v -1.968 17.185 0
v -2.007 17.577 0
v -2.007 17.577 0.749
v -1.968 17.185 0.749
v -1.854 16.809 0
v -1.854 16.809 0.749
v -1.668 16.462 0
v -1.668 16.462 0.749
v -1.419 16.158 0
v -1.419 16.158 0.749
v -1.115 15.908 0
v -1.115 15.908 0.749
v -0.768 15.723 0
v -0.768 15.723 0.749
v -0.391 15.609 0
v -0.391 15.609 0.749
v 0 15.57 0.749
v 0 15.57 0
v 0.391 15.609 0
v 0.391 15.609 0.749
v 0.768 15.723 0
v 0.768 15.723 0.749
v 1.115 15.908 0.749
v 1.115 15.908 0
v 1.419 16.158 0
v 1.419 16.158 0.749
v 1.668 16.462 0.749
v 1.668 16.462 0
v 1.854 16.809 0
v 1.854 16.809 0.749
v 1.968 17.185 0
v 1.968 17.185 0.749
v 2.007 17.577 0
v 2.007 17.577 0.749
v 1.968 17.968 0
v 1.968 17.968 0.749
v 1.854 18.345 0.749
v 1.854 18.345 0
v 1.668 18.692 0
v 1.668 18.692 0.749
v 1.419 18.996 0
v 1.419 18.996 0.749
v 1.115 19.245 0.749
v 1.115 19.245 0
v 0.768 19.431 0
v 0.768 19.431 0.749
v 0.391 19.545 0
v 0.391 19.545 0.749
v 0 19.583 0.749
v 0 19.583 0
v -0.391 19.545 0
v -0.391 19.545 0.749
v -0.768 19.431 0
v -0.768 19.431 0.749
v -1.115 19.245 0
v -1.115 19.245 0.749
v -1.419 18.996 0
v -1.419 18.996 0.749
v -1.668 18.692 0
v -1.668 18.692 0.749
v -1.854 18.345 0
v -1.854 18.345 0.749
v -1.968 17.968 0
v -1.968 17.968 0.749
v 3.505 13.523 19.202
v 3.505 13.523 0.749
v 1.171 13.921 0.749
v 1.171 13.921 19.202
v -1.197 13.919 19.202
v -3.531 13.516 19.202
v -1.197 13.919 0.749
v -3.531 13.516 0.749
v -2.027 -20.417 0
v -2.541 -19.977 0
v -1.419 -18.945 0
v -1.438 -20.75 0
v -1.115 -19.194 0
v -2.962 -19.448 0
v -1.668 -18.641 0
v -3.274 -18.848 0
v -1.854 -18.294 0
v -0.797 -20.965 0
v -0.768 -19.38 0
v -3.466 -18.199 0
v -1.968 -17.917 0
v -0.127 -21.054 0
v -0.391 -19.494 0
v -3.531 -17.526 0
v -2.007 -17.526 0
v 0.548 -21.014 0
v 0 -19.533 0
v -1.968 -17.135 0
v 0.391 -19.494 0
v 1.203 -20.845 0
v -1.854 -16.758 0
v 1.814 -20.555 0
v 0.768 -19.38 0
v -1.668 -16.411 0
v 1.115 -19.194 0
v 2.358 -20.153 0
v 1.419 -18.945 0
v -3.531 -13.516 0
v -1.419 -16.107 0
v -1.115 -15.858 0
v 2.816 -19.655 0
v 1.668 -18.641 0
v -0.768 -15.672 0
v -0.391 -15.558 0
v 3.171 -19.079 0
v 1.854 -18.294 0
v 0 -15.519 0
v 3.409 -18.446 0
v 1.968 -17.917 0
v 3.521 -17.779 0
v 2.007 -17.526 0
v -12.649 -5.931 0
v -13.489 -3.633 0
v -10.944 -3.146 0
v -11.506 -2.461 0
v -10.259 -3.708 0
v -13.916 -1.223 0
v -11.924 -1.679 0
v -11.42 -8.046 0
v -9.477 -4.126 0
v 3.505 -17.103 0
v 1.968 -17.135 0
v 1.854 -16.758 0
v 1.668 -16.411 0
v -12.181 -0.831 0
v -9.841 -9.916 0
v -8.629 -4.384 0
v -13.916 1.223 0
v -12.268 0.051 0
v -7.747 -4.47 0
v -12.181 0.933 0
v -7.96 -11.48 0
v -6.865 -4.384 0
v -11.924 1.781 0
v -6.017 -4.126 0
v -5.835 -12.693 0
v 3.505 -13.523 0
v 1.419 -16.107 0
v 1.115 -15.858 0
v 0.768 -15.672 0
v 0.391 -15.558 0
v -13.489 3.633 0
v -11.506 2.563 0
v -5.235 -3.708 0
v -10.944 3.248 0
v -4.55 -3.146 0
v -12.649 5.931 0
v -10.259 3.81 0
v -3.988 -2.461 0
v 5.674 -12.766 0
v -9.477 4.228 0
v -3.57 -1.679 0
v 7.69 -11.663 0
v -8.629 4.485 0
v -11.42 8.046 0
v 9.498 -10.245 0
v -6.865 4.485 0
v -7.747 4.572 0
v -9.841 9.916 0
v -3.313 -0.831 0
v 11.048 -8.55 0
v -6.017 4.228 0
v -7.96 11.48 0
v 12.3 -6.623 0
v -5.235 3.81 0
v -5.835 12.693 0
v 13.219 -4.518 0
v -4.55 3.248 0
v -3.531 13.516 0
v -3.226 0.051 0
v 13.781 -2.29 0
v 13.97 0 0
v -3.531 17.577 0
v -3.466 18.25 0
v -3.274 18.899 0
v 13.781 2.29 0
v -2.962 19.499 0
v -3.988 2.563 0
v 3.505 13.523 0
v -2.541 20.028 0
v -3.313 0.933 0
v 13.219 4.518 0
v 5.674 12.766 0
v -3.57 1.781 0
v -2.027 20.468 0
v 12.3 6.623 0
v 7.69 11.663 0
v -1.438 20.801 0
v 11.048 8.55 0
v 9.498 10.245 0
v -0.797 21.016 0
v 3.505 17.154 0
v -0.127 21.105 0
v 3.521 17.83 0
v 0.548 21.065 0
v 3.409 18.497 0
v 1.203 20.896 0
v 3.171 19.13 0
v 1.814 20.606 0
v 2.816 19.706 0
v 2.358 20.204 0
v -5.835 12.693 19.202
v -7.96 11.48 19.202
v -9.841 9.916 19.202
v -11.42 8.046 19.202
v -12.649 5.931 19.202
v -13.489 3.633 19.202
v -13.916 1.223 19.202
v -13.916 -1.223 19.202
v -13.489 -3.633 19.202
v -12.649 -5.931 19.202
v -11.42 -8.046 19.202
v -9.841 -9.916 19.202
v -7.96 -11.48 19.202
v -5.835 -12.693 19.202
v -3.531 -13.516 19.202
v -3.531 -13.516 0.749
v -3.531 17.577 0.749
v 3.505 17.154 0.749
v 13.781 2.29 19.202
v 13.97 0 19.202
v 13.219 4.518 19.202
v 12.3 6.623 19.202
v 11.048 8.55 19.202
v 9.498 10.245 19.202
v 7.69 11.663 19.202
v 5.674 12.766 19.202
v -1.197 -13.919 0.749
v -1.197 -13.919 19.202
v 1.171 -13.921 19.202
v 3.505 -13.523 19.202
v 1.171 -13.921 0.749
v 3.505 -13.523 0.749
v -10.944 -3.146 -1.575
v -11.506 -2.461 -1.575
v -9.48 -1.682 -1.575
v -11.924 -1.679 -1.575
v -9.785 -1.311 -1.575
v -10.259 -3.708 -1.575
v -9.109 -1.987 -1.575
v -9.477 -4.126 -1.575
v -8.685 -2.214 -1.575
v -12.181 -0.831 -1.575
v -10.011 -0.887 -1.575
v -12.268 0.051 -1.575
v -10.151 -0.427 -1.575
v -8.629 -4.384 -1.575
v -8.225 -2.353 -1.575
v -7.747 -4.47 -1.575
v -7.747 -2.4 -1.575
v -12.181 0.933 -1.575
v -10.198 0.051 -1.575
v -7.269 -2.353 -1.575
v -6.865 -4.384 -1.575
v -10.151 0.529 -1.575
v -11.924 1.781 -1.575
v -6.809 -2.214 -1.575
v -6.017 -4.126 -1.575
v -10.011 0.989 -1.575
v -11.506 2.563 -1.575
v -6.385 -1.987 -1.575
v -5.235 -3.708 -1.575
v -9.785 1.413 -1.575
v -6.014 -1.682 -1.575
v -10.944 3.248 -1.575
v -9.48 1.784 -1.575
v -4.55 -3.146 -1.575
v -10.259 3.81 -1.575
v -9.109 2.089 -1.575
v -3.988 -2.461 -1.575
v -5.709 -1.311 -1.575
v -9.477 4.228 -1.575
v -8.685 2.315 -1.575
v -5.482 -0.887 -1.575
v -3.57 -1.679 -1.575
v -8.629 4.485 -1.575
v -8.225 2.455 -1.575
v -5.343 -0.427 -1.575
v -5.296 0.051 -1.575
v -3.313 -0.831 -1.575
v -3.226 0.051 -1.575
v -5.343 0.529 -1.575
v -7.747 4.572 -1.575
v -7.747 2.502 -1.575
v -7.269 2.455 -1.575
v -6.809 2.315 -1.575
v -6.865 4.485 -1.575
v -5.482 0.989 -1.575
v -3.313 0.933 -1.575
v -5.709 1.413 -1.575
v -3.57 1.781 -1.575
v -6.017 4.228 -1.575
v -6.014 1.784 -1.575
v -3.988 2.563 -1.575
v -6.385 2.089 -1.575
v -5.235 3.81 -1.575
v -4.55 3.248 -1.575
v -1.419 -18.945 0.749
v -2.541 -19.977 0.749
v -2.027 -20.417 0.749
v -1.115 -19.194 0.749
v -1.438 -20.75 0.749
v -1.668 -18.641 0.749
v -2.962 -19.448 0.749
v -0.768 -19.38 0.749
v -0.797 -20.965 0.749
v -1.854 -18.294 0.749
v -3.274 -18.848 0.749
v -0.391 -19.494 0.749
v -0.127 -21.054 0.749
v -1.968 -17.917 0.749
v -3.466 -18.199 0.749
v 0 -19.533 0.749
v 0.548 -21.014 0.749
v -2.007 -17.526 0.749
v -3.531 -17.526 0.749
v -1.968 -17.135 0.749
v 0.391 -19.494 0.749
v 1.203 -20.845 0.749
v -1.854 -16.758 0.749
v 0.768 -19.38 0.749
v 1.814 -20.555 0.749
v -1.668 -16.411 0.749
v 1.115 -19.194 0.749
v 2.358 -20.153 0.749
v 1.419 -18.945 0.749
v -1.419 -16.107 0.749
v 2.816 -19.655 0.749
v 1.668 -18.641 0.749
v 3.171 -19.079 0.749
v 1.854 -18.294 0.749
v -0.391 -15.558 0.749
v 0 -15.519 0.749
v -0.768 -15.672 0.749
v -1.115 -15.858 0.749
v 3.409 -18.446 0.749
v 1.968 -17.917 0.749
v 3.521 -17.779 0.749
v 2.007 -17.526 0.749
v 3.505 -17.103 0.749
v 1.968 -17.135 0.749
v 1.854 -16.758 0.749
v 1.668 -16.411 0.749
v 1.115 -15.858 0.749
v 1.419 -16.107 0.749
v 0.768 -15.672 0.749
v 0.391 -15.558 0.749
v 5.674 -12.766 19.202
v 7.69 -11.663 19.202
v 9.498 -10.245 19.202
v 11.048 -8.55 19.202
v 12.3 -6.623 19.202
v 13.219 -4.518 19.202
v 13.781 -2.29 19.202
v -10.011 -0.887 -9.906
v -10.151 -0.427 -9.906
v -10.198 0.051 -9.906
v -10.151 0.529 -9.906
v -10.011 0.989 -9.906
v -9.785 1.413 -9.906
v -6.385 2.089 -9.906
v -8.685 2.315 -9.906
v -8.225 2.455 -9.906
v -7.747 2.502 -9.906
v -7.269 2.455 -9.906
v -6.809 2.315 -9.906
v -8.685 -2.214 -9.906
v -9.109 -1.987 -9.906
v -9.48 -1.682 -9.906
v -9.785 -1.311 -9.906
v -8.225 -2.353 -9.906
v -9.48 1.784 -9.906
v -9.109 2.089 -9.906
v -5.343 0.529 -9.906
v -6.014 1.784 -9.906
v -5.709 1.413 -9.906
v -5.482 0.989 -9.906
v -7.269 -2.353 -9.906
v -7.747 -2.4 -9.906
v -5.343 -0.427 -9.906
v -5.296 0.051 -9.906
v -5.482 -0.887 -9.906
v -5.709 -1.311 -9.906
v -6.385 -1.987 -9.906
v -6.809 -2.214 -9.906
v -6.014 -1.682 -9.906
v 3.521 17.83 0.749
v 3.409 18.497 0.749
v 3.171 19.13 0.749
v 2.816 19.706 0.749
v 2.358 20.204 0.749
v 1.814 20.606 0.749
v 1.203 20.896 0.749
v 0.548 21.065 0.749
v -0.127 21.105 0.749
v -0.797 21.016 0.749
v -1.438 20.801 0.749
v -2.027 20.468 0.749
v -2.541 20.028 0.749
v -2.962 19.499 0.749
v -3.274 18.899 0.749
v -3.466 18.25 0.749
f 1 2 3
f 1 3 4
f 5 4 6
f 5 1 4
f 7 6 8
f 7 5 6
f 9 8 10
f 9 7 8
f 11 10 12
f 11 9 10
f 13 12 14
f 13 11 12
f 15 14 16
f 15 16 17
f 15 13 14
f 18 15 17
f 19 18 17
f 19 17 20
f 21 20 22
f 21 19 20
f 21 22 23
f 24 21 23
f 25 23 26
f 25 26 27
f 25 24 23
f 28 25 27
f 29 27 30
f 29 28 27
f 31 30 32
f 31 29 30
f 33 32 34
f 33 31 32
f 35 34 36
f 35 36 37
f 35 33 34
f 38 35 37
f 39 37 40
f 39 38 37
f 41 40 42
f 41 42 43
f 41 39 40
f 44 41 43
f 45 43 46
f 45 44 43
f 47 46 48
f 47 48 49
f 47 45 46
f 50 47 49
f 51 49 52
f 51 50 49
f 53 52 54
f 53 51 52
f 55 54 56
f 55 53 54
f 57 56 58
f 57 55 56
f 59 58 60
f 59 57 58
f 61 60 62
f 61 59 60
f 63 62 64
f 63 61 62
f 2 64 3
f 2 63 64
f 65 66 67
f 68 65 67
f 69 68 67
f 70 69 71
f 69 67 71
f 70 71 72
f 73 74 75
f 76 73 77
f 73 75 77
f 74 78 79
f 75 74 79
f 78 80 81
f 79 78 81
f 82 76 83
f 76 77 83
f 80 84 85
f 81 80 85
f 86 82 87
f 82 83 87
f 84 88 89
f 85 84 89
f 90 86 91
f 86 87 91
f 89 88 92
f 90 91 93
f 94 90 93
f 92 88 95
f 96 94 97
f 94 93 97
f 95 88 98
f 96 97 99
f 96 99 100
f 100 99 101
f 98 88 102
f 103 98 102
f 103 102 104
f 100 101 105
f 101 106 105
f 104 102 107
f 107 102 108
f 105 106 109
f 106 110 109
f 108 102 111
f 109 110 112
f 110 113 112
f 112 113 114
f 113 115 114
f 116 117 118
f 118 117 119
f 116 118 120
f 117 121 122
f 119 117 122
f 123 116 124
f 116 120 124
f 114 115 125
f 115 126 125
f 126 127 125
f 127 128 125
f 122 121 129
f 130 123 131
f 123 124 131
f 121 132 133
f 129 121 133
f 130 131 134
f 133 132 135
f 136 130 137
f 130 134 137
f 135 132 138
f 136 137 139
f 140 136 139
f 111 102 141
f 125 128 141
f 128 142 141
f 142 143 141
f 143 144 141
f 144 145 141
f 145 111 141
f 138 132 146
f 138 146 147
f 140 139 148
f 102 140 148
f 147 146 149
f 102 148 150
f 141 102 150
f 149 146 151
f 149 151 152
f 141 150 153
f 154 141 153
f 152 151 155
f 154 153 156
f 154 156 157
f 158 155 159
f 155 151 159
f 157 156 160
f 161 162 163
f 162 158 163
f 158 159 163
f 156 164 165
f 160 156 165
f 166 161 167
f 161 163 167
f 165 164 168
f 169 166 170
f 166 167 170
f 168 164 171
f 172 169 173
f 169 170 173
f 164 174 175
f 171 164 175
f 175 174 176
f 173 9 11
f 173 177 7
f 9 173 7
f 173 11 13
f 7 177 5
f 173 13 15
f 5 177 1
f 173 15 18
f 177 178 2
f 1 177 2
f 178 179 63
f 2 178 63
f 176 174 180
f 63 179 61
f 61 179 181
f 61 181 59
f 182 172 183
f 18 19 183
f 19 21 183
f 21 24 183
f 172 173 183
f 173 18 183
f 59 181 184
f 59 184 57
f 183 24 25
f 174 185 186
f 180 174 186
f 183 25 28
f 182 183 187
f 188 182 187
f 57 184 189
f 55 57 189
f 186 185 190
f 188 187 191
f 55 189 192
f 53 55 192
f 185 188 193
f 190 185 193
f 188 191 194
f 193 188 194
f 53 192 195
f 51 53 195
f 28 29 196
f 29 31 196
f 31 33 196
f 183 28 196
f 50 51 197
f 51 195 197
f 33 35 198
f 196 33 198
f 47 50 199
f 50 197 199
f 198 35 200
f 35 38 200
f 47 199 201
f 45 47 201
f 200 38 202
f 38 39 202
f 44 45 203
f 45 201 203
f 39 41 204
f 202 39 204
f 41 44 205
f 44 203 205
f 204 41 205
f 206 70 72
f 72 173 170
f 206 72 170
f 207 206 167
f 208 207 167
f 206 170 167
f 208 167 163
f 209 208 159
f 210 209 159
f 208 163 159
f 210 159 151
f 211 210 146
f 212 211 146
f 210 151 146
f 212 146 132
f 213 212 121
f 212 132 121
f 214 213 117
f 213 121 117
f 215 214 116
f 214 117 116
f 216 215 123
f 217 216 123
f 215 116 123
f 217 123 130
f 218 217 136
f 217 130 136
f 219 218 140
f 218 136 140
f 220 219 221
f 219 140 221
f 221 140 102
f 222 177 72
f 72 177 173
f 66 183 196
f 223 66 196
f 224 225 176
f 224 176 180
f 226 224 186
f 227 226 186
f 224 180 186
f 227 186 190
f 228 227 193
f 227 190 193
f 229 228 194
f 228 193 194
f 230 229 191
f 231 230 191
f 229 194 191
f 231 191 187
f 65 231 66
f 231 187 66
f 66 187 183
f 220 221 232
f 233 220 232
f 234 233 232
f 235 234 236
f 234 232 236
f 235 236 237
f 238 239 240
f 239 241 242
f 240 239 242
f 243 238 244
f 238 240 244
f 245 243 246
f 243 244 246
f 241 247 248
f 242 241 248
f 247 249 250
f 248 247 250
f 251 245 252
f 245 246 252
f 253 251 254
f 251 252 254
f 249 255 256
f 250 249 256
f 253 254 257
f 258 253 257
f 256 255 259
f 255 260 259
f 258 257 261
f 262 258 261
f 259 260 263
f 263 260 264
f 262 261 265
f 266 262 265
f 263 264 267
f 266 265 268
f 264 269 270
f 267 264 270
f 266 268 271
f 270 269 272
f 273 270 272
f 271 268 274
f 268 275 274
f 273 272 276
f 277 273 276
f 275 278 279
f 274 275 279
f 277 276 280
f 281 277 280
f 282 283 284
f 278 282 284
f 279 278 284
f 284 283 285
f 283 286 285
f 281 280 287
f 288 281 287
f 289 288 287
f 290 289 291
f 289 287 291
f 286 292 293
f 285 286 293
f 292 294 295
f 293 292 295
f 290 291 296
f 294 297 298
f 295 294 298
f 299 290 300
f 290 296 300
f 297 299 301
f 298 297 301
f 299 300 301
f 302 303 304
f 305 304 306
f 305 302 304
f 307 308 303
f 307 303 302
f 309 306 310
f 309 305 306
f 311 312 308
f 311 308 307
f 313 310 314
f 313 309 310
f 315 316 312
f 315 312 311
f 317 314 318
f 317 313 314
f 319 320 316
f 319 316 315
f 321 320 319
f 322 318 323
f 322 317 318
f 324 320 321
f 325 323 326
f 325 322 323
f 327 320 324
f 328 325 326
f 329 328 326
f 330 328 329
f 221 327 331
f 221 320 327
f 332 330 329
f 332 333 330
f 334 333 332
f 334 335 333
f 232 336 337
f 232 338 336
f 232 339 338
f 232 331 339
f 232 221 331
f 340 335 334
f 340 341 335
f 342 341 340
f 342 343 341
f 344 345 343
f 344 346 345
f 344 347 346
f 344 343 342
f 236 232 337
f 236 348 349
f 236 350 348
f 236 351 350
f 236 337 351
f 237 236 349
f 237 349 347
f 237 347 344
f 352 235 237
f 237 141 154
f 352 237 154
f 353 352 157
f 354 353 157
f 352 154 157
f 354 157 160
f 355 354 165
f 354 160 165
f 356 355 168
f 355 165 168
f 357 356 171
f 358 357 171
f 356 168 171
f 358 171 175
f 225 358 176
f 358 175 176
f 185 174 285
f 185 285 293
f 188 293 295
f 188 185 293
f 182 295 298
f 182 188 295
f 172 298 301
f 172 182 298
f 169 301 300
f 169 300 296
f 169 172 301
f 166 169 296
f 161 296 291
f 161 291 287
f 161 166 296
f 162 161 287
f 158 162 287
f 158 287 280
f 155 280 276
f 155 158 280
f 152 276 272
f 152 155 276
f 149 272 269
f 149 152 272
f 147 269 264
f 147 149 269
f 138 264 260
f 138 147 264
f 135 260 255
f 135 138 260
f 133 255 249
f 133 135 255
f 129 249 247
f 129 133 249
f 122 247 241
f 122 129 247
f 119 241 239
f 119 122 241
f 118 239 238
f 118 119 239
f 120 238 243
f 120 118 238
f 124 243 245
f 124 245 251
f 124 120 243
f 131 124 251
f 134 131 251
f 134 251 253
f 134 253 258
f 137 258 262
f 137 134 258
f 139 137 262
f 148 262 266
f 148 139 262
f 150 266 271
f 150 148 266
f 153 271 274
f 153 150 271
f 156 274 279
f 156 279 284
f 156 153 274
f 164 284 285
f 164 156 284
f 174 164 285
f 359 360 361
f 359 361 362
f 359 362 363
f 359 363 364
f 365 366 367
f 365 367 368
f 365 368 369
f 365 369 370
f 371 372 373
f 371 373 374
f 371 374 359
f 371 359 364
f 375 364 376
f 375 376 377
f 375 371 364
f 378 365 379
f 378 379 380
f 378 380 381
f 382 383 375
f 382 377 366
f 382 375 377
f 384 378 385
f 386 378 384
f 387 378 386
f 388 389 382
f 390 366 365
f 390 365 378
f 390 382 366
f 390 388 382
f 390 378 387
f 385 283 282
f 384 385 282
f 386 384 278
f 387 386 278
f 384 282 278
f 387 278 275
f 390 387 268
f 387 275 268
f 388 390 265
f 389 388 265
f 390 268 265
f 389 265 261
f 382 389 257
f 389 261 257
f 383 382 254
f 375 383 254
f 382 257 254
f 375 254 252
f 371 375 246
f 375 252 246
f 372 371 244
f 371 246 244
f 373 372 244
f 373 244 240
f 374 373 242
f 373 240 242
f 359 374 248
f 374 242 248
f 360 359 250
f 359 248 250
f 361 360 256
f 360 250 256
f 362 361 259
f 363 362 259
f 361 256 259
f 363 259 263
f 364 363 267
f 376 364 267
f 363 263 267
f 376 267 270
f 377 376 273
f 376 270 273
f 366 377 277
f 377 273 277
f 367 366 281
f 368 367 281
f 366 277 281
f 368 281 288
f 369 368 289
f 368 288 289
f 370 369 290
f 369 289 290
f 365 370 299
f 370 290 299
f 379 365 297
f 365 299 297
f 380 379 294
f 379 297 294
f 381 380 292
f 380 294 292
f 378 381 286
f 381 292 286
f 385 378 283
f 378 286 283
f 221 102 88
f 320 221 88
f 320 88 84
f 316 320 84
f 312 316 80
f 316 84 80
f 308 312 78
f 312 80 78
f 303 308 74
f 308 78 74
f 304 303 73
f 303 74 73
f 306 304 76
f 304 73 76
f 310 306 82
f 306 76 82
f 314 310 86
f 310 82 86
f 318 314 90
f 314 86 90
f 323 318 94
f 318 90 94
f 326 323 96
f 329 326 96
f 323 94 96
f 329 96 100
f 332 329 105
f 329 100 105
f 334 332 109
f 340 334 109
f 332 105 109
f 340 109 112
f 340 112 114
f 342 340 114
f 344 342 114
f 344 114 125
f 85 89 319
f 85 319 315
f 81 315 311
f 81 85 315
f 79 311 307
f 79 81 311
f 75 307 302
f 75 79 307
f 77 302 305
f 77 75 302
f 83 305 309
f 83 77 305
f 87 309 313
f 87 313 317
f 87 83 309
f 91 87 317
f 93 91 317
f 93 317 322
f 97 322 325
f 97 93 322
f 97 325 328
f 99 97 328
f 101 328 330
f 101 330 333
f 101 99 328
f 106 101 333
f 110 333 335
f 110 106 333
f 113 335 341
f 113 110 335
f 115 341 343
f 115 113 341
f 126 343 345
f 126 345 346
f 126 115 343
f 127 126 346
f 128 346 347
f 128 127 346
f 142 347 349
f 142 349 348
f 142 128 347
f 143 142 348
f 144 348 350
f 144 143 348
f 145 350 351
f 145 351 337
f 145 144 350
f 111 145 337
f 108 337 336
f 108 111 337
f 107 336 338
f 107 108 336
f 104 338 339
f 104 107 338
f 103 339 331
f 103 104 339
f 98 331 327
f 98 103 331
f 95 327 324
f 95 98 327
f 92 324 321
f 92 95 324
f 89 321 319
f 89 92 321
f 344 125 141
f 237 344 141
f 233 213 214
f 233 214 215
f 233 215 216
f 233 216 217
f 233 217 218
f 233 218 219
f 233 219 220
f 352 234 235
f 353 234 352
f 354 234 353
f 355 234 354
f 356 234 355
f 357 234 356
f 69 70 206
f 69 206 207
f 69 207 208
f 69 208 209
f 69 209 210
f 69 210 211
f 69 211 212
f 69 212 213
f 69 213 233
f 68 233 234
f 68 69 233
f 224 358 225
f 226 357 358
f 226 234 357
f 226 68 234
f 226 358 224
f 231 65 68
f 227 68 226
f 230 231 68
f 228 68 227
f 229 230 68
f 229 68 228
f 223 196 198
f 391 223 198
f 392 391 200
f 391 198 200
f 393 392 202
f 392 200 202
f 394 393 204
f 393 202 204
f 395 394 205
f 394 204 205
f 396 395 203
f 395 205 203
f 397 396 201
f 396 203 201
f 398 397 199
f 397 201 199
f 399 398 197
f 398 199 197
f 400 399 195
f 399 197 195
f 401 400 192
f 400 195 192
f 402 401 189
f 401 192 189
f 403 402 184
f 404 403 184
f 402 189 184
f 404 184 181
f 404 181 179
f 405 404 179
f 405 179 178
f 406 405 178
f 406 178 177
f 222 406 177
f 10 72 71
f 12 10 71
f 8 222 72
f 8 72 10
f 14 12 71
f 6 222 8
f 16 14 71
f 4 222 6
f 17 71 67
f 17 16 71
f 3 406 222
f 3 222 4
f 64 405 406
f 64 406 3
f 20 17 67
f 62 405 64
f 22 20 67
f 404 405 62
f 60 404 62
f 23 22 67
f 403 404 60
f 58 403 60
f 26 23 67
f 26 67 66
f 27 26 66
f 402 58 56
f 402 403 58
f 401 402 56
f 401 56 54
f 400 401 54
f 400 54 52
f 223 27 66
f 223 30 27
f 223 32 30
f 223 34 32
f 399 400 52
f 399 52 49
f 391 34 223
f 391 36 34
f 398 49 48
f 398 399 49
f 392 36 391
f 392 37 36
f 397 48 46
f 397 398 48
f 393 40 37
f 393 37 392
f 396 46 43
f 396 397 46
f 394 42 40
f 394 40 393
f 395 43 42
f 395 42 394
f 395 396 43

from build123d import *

# Parameters (mm, degrees)
SKETCH1_R           = 13.97
BOSS_EXTRUDE1_DEPTH = 19.2024
SKETCH1_3_R         = 2.0066
BOSS_EXTRUDE2_DEPTH = 0.7493
SKETCH2_R           = 4.5212
BOSS_EXTRUDE3_DEPTH = 1.5748
SKETCH3_R           = 2.4511
BOSS_EXTRUDE4_DEPTH = 8.3312


with BuildPart() as part:
    # Sketch1 → Boss-Extrude1 (new body)
    with BuildSketch(Plane.XY):
        Circle(SKETCH1_R)
    extrude(amount=BOSS_EXTRUDE1_DEPTH)

    # Sketch1<3> → Boss-Extrude2 (add)
    # profile 1 of 2: a face of its own
    with BuildSketch(Plane.XY):
        with BuildLine():
            Line((3.5052, 13.52310885), (3.5052, 17.154059749))
            ThreePointArc((3.5052, 17.154059749), (0.211751316, 21.101044279), (-3.5306, 17.5768))
            Line((-3.5306, 17.5768), (-3.5306, 13.516499682))
            ThreePointArc((-3.5306, 13.516499682), (-0.013122891, 13.969993836), (3.5052, 13.52310885))
        make_face()
        with Locations((0, 17.5768)):
            Circle(SKETCH1_3_R, mode=Mode.SUBTRACT)
    # profile 2 of 2: a face of its own
    with BuildSketch(Plane.XY):
        with BuildLine():
            ThreePointArc((3.5052, -13.52310885), (-0.013122891, -13.969993836), (-3.5306, -13.516499682))
            Line((-3.5306, -13.516499682), (-3.5306, -17.526))
            ThreePointArc((-3.5306, -17.526), (0.211751316, -21.050244279), (3.5052, -17.103259749))
            Line((3.5052, -17.103259749), (3.5052, -13.52310885))
        make_face()
        with Locations((0, -17.526)):
            Circle(SKETCH1_3_R, mode=Mode.SUBTRACT)
    extrude(amount=BOSS_EXTRUDE2_DEPTH)

    # Sketch2 → Boss-Extrude3 (add)
    with BuildSketch(Plane.XY):
        with Locations((-7.746833441, 0.0508)):
            Circle(SKETCH2_R)
    extrude(amount=-BOSS_EXTRUDE3_DEPTH)

    # Sketch3 → Boss-Extrude4 (add)
    with BuildSketch(Plane(origin=(0, 0, -1.5748), x_dir=(-1, 0, 0), z_dir=(0, 0, -1))):
        with Locations((7.746833441, 0.0508)):
            Circle(SKETCH3_R)
    extrude(amount=BOSS_EXTRUDE4_DEPTH)


solid = part.part
